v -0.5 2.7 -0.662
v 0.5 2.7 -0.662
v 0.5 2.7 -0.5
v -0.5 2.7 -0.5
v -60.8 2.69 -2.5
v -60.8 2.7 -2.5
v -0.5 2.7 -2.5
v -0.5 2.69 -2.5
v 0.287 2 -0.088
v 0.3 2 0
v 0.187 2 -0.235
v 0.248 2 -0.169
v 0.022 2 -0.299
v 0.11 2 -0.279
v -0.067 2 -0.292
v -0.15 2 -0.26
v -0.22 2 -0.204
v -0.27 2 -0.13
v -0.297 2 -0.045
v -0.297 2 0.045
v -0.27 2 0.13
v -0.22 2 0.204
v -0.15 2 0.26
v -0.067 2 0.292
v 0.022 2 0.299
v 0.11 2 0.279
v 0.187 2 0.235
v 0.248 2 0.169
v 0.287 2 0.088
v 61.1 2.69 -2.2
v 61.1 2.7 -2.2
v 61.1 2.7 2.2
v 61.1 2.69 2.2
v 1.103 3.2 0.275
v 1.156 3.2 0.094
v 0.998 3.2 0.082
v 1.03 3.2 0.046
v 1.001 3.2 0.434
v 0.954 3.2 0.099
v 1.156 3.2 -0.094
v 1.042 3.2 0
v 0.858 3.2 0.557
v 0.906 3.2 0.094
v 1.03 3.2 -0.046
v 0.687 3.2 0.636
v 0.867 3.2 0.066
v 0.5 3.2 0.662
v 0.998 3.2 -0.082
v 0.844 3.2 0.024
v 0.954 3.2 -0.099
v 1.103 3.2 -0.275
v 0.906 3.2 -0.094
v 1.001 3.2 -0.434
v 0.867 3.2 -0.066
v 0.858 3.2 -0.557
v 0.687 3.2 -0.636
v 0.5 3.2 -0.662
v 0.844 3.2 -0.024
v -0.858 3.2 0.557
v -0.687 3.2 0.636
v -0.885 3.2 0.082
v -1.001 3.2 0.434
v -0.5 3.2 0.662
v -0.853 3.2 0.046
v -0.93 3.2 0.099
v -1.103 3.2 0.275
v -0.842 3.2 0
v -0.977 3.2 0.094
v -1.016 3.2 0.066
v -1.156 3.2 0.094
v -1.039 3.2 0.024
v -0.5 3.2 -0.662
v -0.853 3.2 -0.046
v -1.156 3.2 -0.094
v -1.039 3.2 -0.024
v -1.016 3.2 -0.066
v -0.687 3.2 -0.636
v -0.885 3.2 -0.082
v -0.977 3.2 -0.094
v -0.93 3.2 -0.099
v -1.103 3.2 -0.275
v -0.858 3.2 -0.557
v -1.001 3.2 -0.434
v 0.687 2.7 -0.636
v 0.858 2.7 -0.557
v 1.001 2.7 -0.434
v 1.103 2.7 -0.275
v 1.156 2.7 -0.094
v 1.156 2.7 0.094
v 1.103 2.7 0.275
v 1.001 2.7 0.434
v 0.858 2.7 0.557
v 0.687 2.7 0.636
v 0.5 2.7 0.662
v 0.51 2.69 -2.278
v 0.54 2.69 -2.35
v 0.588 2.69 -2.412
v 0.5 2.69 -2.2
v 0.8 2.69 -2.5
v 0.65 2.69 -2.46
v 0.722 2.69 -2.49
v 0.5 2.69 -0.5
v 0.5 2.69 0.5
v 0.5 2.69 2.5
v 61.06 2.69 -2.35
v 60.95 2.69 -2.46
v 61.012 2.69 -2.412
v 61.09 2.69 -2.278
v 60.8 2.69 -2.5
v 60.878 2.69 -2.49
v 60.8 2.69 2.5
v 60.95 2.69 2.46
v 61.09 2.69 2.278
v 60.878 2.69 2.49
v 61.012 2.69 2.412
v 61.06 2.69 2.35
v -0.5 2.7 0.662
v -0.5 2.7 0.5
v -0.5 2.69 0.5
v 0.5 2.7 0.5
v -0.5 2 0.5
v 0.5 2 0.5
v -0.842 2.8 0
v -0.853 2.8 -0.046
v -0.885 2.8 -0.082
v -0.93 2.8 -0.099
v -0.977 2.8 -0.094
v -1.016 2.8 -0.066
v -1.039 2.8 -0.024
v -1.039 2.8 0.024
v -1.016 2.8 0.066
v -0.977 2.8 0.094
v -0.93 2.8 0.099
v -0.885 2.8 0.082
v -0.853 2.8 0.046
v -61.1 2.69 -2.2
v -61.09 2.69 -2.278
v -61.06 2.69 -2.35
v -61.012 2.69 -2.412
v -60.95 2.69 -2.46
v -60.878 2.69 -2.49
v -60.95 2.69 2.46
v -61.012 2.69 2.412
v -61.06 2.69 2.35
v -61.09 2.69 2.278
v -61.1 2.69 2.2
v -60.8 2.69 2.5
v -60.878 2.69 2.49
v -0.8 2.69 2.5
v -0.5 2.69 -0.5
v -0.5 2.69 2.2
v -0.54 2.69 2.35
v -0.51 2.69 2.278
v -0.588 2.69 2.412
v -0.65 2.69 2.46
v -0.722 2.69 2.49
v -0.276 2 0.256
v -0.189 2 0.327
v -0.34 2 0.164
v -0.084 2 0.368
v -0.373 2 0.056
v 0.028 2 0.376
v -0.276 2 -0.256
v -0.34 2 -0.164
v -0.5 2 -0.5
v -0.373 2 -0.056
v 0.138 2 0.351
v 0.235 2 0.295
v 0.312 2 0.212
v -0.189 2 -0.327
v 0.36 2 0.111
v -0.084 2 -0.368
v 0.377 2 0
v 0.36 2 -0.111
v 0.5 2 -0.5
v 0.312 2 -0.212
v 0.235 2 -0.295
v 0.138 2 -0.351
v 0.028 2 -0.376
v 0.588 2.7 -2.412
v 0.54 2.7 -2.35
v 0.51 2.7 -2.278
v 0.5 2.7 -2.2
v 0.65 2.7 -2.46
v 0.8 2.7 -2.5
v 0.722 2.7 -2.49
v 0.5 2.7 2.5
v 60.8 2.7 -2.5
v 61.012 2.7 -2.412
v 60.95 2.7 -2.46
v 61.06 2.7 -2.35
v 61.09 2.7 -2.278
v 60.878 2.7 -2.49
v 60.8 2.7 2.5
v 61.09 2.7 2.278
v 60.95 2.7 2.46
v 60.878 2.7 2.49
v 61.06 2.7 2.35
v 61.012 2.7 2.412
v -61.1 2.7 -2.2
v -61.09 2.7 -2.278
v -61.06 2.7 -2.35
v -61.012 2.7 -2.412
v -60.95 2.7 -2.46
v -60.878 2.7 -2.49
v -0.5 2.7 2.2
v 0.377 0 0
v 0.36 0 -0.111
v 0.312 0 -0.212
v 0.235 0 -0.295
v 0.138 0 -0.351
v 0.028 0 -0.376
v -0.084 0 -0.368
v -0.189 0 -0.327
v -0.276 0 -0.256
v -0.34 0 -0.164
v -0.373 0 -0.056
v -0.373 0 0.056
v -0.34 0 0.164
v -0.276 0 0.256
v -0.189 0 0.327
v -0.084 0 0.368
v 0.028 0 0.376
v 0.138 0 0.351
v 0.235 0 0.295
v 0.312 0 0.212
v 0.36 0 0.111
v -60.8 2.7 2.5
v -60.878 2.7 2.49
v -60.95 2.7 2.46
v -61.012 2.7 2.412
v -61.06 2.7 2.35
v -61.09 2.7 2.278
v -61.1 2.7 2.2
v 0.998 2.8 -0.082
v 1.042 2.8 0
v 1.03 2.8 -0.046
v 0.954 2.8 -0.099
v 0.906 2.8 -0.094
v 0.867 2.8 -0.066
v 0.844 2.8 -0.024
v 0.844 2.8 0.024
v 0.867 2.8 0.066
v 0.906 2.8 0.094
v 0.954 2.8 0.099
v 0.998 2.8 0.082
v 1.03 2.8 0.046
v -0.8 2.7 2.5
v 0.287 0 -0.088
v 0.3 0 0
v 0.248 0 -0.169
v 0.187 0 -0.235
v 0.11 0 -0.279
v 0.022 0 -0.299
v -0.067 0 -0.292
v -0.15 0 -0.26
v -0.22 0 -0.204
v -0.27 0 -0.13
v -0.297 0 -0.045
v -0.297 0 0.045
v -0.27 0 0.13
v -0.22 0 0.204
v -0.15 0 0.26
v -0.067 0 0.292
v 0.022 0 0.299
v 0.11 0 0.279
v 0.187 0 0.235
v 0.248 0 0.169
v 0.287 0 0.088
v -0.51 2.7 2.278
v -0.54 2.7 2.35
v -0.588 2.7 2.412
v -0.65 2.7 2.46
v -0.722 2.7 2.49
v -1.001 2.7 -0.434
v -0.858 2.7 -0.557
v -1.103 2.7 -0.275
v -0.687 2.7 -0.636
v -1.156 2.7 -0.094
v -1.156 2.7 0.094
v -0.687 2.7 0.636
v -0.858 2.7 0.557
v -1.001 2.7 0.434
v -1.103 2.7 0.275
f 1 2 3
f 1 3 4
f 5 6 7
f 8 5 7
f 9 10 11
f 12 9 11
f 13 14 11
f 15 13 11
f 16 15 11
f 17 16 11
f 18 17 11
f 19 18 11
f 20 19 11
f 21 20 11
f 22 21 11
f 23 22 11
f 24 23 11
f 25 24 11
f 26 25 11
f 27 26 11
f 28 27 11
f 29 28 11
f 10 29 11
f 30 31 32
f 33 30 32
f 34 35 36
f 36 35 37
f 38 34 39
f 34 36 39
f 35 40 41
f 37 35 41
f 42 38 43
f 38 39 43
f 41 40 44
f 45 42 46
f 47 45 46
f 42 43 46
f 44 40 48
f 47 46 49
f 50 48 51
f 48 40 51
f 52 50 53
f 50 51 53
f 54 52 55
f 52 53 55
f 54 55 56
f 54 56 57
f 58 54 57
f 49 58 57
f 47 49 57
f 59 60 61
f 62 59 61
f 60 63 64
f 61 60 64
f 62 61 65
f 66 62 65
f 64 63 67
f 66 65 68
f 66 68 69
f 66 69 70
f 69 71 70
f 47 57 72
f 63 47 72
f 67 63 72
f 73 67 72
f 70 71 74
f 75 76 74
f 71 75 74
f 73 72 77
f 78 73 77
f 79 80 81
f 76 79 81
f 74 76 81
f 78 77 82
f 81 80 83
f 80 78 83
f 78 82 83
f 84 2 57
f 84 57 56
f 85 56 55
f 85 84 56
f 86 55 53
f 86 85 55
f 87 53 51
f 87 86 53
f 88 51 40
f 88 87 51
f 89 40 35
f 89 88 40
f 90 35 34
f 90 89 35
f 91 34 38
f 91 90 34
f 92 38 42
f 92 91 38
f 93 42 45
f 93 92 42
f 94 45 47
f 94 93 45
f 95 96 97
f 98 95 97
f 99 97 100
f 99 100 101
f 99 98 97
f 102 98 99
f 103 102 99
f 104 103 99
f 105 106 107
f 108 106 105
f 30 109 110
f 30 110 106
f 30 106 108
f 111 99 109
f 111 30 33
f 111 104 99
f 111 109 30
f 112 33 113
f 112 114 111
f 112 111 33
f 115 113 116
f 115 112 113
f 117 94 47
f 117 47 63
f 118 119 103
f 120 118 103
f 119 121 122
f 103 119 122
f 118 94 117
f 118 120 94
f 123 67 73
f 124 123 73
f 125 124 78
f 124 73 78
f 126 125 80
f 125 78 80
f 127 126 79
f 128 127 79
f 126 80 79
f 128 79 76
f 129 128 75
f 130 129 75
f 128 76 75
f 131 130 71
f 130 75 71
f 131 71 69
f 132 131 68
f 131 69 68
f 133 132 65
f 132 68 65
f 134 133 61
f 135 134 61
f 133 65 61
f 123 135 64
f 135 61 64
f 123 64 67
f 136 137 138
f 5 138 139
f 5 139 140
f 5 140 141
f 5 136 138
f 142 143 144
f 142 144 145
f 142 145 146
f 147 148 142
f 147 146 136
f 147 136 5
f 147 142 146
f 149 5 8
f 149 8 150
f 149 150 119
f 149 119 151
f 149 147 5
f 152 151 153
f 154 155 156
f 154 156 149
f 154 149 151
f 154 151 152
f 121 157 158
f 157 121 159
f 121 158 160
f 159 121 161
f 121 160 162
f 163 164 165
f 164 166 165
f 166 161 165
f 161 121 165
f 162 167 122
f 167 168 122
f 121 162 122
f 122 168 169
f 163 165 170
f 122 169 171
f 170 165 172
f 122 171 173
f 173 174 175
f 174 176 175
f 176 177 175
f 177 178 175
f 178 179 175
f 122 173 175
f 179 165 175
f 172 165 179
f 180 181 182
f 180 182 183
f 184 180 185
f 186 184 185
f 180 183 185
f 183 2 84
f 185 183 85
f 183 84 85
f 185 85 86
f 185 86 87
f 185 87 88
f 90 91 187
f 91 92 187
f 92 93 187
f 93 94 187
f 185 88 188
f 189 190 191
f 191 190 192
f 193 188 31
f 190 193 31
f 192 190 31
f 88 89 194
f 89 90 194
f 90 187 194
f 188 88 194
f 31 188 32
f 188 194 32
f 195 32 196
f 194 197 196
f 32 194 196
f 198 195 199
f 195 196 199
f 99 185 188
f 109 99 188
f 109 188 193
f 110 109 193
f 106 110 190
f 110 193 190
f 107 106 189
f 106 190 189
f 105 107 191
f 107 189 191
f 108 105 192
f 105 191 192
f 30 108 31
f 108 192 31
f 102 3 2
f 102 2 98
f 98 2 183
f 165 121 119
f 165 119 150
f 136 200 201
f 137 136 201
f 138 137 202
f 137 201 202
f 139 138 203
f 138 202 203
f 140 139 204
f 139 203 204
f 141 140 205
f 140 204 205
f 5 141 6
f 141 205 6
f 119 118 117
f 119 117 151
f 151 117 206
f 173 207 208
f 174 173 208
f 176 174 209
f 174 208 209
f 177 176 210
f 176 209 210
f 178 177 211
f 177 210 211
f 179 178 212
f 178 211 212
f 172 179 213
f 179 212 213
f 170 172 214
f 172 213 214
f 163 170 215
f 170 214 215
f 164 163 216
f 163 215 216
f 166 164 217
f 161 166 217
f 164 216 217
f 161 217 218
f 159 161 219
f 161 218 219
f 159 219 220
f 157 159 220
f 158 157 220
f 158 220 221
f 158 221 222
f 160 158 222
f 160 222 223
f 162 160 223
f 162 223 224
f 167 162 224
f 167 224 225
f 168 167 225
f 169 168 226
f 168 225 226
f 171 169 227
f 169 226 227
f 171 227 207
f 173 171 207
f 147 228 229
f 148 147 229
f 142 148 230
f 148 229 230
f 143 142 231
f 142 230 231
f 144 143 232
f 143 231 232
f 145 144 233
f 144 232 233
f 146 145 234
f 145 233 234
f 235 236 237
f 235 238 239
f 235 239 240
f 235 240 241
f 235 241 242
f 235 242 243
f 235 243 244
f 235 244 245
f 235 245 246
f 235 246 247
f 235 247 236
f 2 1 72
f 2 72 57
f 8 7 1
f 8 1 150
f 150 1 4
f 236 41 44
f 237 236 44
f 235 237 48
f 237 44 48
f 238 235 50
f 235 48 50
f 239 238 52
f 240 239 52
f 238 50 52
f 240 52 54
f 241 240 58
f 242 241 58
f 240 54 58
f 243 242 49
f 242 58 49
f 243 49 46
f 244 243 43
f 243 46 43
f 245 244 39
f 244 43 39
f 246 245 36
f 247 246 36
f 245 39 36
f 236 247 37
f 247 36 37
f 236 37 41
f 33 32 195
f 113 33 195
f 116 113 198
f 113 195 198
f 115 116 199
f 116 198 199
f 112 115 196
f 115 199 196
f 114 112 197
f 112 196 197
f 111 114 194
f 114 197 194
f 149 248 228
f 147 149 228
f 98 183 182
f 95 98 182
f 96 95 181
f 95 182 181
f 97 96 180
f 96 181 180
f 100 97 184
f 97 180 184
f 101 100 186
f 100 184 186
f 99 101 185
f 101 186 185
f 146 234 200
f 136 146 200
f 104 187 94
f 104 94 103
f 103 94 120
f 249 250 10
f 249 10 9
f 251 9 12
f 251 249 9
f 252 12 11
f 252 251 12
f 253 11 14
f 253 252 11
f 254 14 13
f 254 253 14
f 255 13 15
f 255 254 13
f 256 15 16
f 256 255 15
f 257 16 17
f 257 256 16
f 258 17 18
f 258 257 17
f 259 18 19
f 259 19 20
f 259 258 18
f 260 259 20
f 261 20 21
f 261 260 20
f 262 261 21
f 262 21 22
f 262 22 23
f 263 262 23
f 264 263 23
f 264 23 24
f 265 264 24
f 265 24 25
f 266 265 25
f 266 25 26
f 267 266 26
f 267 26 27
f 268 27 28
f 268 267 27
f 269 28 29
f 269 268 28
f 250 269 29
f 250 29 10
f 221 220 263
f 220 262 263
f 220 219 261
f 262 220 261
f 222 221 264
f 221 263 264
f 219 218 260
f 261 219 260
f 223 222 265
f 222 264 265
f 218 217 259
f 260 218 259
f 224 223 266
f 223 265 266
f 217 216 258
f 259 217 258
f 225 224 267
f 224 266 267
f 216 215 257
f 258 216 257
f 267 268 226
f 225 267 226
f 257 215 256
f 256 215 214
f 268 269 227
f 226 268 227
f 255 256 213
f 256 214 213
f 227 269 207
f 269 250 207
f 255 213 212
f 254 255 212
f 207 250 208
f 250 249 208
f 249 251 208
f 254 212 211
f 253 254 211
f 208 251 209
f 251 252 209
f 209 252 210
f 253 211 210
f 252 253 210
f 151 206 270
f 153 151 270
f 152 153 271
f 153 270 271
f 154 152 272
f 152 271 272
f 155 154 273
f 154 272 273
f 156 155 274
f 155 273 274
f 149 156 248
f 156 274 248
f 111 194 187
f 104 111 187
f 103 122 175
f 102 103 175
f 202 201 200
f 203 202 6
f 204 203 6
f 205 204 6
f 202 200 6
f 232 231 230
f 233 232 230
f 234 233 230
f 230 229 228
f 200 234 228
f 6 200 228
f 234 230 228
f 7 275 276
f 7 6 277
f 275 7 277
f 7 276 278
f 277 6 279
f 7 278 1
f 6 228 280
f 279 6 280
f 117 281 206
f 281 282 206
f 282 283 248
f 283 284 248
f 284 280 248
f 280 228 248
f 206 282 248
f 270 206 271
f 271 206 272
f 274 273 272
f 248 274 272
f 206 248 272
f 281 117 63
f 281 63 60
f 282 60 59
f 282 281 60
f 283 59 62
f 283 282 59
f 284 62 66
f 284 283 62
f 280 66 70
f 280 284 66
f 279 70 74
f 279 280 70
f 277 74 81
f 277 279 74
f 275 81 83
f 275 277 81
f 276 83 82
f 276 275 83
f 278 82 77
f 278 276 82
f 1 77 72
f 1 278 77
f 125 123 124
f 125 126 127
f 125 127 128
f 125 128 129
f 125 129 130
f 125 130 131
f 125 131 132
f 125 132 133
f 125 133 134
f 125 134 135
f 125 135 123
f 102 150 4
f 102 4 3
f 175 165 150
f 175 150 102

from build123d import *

# Parameters (mm, degrees)
SKETCH1_R           = 0.37702405
SKETCH1_R_2         = 0.3
BOSS_EXTRUDE1_DEPTH = 2
SKETCH2_W           = 1
SKETCH2_H           = 1
BOSS_EXTRUDE2_DEPTH = 0.7
BOSS_EXTRUDE3_DEPTH = 0.5
SKETCH4_R           = 0.1
CUT_EXTRUDE2_DEPTH  = 0.4
BOSS_EXTRUDE4_DEPTH = 0.01


with BuildPart() as part:
    # Sketch1 → Boss-Extrude1 (new body)
    with BuildSketch(Plane(origin=(0, 0, 0), x_dir=(1, 0, 0), z_dir=(0, 1, 0))):
        Circle(SKETCH1_R)
        Circle(SKETCH1_R_2, mode=Mode.SUBTRACT)
    extrude(amount=BOSS_EXTRUDE1_DEPTH)

    # Sketch2 → Boss-Extrude2 (add)
    with BuildSketch(Plane(origin=(0, 2, 0), x_dir=(1, 0, 0), z_dir=(0, 1, 0))):
        Rectangle(SKETCH2_W, SKETCH2_H)
    extrude(amount=BOSS_EXTRUDE2_DEPTH)

    # Sketch3 → Boss-Extrude3 (add)
    with BuildSketch(Plane(origin=(0, 2.7, 0), x_dir=(1, 0, 0), z_dir=(0, 1, 0))):
        with BuildLine():
            Line((-0.5, 0.662390112), (0.5, 0.662390112))
            ThreePointArc((0.5, 0.662390112), (1.162390112, 0), (0.5, -0.662390112))
            Line((0.5, -0.662390112), (-0.5, -0.662390112))
            ThreePointArc((-0.5, -0.662390112), (-1.162390112, 0), (-0.5, 0.662390112))
        make_face()
    extrude(amount=BOSS_EXTRUDE3_DEPTH)

    # Sketch4 → Cut-Extrude2 (cut)
    with BuildSketch(Plane(origin=(0, 3.2, 0), x_dir=(1, 0, 0), z_dir=(0, 1, 0))):
        with Locations((-0.941559445, 0)):
            Circle(SKETCH4_R)
        with Locations((0.941559445, 0)):
            Circle(SKETCH4_R)
    extrude(amount=-CUT_EXTRUDE2_DEPTH, mode=Mode.SUBTRACT)

    # Sketch5 → Boss-Extrude4 (add)
    with BuildSketch(Plane.XZ.offset(-2.7)):
        with BuildLine():
            Line((0.8, -2.5), (60.8, -2.5))
            ThreePointArc((60.8, -2.5), (61.012132034, -2.412132034), (61.1, -2.2))
            Line((61.1, -2.2), (61.1, 2.2))
            ThreePointArc((61.1, 2.2), (61.012132034, 2.412132034), (60.8, 2.5))
            Line((60.8, 2.5), (0.5, 2.5))
            Line((0.5, 2.5), (0.5, -2.2))
            ThreePointArc((0.5, -2.2), (0.587867966, -2.412132034), (0.8, -2.5))
        make_face()
        with BuildLine():
            Line((-0.8, 2.5), (-60.8, 2.5))
            ThreePointArc((-60.8, 2.5), (-61.012132034, 2.412132034), (-61.1, 2.2))
            Line((-61.1, 2.2), (-61.1, -2.2))
            ThreePointArc((-61.1, -2.2), (-61.012132034, -2.412132034), (-60.8, -2.5))
            Line((-60.8, -2.5), (-0.8, -2.5))
            Line((-0.8, -2.5), (-0.5, -2.5))
            Line((-0.5, -2.5), (-0.5, -2.2))
            Line((-0.5, -2.2), (-0.5, 2.2))
            ThreePointArc((-0.5, 2.2), (-0.587867966, 2.412132034), (-0.8, 2.5))
        make_face()
    extrude(amount=BOSS_EXTRUDE4_DEPTH)


solid = part.part
